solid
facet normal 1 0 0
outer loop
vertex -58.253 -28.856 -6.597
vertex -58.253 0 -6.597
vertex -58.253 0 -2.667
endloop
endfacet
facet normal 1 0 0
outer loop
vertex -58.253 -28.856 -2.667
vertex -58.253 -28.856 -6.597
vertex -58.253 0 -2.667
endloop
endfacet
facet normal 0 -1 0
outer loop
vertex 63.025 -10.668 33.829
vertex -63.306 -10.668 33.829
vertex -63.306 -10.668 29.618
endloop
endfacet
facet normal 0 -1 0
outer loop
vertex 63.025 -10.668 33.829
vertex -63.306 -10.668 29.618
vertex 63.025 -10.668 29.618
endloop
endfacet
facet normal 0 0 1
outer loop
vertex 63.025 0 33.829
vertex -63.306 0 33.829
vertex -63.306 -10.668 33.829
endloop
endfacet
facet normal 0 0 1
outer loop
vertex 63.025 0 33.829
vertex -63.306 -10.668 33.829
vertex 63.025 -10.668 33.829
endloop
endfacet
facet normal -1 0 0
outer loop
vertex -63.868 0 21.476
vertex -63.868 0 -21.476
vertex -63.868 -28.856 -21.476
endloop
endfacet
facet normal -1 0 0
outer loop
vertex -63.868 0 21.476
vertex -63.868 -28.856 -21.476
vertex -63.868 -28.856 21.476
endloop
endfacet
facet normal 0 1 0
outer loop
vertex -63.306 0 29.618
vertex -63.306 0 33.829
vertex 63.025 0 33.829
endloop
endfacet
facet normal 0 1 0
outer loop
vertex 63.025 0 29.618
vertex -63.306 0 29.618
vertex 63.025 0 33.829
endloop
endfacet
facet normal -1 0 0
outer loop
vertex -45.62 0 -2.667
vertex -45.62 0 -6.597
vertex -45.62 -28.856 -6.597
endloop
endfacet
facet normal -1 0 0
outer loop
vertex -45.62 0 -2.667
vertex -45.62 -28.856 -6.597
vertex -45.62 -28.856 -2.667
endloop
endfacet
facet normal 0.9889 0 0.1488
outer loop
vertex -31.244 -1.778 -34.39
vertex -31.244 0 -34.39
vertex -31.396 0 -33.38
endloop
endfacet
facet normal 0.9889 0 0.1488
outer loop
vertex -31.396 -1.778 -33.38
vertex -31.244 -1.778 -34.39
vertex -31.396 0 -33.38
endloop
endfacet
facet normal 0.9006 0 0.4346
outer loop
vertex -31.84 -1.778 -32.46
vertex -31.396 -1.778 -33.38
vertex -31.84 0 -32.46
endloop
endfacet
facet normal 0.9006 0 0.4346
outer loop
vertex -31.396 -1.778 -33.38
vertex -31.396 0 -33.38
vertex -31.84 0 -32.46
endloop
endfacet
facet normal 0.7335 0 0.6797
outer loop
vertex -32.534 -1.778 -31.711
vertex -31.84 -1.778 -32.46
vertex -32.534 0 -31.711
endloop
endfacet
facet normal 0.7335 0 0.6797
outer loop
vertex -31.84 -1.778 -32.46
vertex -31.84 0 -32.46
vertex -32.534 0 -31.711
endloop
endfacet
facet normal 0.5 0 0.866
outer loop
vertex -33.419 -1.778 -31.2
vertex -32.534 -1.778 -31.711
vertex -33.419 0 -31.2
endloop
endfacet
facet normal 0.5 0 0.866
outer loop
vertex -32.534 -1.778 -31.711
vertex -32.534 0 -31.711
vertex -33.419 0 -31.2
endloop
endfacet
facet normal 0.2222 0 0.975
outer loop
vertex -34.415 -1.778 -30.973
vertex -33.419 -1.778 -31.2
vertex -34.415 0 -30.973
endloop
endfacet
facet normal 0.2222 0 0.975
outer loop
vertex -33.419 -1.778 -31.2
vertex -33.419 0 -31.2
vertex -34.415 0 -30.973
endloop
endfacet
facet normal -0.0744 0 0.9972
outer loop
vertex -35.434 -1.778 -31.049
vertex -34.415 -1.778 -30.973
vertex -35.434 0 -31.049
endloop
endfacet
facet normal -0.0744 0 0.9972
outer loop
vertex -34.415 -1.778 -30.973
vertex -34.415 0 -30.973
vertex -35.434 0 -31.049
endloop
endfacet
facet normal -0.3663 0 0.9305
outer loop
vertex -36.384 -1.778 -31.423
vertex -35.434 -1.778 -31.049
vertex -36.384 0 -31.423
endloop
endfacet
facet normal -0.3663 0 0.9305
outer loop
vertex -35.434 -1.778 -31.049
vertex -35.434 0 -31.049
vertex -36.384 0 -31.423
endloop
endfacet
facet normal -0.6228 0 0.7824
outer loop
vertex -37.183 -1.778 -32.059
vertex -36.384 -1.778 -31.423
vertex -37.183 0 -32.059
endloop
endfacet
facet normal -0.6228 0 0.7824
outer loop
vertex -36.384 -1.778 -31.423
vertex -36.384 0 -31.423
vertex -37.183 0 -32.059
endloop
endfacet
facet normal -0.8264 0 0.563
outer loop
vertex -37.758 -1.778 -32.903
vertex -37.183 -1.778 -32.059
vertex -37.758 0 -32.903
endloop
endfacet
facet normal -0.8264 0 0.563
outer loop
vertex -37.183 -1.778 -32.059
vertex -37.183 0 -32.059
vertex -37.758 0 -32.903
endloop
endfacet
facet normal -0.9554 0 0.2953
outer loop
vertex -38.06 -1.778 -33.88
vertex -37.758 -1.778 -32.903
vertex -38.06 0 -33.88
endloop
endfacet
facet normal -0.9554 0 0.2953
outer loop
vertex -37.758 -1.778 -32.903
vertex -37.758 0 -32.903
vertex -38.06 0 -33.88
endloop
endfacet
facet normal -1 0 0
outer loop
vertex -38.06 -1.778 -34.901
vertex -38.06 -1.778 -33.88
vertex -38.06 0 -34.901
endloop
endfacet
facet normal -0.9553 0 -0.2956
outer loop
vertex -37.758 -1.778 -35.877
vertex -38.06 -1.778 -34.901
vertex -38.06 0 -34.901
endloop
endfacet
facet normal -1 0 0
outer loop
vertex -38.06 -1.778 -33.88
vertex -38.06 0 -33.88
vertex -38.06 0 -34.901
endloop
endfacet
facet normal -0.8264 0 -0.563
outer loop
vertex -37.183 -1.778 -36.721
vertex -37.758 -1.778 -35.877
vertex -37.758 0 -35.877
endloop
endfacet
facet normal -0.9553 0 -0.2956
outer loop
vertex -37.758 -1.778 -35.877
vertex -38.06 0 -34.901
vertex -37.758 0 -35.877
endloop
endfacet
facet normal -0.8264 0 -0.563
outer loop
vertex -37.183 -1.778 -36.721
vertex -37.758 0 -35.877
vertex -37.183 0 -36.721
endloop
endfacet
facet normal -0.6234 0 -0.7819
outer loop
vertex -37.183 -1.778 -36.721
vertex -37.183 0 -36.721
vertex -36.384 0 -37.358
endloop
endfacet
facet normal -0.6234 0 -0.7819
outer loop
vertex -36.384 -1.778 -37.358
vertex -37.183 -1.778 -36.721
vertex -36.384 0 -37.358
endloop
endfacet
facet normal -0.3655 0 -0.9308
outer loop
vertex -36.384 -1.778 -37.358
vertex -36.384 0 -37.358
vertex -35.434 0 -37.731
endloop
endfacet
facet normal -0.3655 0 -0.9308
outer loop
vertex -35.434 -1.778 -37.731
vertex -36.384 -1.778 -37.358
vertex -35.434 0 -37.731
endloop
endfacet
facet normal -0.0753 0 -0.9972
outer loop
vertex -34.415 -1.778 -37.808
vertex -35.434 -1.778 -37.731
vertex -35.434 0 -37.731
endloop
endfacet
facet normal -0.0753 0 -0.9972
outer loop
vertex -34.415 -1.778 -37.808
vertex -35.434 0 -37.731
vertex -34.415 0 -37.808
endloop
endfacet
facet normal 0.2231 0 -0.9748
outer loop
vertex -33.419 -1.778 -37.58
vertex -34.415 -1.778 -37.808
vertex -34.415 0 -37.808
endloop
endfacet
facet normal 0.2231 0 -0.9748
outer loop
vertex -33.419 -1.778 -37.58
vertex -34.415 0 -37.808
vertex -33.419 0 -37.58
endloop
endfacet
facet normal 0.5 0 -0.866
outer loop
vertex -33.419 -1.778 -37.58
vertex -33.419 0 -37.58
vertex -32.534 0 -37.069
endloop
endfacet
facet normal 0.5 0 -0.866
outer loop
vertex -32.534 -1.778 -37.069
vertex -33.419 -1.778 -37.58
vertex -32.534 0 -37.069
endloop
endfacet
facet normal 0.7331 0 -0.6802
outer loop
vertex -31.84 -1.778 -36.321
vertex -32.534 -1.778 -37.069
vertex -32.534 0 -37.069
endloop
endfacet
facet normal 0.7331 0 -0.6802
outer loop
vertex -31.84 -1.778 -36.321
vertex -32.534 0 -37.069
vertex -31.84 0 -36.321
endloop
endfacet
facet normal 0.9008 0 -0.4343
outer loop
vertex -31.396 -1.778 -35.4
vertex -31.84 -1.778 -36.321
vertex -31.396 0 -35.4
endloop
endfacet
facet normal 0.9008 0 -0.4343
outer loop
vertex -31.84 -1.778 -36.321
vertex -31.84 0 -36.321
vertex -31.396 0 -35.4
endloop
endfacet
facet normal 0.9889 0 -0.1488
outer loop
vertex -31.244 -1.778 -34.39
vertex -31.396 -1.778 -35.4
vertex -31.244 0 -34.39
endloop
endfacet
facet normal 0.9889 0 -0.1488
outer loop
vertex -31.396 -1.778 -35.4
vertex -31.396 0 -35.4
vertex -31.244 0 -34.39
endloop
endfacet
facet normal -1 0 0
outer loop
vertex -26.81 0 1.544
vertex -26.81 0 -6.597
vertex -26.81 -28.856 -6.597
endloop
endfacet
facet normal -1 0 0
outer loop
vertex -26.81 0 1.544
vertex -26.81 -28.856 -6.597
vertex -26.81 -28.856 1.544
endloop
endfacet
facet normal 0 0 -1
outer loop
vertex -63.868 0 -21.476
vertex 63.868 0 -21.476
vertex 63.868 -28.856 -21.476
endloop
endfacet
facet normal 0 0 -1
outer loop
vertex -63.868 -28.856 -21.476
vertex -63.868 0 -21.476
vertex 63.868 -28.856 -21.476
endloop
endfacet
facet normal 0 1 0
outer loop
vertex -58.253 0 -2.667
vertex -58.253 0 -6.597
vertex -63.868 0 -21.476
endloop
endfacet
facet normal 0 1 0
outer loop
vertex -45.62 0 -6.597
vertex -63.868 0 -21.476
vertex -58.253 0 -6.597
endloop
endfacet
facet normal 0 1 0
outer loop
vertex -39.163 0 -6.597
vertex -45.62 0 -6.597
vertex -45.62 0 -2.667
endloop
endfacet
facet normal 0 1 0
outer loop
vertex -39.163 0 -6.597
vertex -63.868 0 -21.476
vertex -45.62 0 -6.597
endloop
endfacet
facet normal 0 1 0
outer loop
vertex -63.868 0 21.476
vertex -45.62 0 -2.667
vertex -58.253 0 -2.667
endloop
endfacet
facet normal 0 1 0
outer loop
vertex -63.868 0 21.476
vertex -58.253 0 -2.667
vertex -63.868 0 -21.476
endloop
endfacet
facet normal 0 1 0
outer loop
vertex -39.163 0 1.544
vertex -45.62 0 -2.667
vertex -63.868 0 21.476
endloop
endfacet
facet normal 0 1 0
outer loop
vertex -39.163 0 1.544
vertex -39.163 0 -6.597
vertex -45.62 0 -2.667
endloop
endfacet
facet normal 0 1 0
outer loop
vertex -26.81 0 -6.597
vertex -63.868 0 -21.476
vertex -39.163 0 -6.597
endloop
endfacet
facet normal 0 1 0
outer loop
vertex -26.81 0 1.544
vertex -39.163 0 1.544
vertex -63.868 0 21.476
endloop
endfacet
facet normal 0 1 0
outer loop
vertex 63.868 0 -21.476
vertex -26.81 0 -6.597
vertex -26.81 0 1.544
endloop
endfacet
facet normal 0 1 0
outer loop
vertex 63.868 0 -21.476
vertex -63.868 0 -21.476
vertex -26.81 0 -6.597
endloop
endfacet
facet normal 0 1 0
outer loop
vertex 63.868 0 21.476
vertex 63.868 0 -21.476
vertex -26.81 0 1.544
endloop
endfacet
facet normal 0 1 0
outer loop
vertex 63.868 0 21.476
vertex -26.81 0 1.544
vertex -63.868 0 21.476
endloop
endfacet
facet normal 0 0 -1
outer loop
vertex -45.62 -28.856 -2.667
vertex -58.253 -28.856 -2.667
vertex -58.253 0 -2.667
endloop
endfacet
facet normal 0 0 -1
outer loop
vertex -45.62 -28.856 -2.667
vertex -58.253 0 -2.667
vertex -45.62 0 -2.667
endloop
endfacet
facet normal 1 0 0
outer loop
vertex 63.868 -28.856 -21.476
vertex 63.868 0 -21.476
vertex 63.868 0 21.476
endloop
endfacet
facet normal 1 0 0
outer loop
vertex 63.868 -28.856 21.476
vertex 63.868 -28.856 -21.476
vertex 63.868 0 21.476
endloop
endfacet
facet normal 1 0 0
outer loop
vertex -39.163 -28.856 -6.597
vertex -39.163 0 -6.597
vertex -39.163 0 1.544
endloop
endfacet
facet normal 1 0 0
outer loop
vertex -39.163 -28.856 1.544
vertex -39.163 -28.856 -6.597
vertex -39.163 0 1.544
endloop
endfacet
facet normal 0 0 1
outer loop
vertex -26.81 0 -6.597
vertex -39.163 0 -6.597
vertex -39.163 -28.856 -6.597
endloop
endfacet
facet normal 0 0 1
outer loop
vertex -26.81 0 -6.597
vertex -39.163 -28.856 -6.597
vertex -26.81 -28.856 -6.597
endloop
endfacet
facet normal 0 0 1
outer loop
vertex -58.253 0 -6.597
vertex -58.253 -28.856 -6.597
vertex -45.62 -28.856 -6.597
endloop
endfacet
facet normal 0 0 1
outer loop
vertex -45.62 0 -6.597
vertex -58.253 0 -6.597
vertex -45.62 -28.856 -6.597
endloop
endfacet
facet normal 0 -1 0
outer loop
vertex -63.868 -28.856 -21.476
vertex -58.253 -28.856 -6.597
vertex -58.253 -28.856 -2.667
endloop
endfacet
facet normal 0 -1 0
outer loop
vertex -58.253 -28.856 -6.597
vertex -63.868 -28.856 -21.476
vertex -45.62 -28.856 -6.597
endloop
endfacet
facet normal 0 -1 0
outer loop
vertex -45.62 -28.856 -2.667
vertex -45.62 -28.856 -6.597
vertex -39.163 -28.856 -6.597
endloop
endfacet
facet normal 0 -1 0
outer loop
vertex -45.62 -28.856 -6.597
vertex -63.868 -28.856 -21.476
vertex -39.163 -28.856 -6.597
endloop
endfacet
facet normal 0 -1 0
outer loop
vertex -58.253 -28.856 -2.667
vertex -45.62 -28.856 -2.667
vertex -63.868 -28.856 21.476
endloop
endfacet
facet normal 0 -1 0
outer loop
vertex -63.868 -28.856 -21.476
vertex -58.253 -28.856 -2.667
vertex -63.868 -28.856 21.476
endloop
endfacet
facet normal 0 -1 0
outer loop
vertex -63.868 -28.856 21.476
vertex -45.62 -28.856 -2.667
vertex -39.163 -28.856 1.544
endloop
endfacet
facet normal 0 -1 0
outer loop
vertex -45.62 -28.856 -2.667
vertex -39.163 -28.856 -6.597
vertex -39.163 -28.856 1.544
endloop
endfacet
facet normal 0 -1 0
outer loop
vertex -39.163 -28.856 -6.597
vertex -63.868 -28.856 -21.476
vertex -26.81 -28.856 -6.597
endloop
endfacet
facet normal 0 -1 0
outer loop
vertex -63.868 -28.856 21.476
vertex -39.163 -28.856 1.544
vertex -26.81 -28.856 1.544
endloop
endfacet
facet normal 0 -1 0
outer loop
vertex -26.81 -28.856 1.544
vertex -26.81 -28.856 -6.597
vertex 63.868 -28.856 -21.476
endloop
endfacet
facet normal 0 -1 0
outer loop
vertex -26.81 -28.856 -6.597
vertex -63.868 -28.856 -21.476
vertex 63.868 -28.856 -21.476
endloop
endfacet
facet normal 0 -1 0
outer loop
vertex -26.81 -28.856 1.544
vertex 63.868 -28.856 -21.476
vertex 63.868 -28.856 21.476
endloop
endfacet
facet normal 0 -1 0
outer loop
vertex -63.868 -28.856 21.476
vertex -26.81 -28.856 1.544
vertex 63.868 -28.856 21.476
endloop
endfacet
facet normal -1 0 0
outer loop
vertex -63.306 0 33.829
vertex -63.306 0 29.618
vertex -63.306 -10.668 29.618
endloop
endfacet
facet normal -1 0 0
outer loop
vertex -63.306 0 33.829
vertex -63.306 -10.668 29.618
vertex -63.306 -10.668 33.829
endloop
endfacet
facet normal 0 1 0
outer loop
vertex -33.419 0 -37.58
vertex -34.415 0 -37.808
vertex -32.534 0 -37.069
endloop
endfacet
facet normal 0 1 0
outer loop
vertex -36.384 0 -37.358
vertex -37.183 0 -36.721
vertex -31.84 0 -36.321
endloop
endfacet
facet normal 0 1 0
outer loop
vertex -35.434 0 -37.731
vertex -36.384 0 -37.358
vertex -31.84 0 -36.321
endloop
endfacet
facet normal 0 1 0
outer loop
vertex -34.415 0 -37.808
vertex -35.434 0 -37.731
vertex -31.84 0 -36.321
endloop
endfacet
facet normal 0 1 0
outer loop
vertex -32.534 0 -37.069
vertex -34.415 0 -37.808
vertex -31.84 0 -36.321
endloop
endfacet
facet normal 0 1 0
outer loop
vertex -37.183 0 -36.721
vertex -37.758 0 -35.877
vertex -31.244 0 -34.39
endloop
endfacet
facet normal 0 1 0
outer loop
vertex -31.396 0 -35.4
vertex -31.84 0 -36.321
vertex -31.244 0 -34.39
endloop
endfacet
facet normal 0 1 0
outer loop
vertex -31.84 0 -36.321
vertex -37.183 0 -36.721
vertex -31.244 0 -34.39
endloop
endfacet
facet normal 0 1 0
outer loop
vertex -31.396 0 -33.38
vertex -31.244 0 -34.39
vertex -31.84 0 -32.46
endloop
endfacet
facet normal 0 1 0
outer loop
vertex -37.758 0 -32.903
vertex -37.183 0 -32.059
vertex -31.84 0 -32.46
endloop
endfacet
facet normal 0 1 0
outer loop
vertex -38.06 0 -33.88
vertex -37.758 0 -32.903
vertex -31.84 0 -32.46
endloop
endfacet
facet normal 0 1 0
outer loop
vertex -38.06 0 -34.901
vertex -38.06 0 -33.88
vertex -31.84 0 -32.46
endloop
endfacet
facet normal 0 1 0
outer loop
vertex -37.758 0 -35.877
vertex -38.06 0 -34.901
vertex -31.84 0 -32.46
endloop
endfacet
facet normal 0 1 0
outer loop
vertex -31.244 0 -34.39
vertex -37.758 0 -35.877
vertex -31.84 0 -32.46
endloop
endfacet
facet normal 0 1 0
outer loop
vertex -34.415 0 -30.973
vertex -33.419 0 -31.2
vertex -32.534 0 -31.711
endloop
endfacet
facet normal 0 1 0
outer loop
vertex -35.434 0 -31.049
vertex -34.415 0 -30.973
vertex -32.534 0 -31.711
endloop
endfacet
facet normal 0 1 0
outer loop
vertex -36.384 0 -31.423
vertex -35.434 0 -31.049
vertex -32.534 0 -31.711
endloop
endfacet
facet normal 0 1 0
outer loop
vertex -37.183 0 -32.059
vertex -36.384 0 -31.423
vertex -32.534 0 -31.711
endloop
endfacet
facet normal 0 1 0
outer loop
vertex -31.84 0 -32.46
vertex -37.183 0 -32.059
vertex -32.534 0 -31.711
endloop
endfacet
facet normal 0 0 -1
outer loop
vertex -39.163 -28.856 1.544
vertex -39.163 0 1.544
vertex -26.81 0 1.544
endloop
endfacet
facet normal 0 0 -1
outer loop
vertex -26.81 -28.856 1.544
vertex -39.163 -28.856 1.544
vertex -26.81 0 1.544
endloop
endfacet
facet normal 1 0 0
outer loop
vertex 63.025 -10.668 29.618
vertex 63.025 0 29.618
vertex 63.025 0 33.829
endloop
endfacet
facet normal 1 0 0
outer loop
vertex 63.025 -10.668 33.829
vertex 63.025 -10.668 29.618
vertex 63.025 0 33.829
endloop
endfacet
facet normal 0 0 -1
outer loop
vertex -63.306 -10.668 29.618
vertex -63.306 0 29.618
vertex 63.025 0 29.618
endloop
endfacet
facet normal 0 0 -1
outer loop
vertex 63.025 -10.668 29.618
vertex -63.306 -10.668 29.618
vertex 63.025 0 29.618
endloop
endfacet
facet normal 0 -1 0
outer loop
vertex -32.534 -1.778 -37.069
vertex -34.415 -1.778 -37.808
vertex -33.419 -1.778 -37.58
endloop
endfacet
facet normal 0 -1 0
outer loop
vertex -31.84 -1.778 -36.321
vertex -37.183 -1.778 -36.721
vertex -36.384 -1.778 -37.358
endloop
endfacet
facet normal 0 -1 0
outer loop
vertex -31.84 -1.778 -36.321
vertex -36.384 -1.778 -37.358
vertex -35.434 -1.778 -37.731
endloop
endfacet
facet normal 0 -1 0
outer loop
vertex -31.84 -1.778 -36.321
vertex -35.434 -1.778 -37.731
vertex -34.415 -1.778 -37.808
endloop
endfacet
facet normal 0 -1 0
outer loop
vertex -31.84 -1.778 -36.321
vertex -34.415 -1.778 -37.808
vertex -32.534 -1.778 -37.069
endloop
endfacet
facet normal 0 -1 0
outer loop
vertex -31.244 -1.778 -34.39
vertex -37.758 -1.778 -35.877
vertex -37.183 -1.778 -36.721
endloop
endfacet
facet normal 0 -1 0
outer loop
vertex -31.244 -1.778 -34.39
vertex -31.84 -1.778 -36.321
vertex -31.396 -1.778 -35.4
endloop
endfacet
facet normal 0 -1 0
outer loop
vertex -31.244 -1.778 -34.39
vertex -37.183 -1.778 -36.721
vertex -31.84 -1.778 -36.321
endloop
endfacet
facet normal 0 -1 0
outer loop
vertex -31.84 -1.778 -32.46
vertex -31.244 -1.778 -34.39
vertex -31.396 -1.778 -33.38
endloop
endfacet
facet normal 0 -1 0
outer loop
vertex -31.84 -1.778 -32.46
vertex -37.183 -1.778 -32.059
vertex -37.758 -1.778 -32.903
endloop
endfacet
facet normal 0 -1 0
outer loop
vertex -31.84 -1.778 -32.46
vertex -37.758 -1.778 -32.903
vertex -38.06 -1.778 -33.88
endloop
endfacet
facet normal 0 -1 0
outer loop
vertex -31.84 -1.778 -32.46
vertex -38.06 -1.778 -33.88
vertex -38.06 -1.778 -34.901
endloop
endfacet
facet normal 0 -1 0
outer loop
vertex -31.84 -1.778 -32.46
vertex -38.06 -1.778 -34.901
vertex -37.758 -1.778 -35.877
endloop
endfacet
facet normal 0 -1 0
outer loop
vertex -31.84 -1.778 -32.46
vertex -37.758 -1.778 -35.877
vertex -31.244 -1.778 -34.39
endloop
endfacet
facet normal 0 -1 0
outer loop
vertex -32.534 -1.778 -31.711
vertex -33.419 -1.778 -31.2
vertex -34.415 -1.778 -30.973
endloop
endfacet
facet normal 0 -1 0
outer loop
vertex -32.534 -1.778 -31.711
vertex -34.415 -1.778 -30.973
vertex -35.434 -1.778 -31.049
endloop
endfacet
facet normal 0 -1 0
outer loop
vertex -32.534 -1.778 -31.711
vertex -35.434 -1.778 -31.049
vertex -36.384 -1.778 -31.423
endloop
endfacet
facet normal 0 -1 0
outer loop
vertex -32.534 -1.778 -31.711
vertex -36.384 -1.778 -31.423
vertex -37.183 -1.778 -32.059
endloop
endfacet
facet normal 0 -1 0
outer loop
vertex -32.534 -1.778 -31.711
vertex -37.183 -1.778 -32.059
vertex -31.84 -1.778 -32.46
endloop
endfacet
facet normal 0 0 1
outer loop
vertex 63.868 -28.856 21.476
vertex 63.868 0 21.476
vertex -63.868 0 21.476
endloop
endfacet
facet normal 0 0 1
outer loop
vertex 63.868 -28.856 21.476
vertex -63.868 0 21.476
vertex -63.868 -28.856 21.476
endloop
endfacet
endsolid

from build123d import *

# Parameters (mm, degrees)
F0_W     = 127.7352720499
F0_H     = 42.9527387023
F0_W_2   = 12.6331597567
F0_H_2   = 3.9303160738
F0_W_3   = 12.3524200171
F0_H_3   = 8.1413685839
F1_DEPTH = 10.16
F2_W     = 126.3315826654
F2_H     = 4.2110495269
F3_DEPTH = 10.668
F4_R     = 3.4268290795
F5_DEPTH = 1.778
F6_DEPTH = 3.5189203918
F7_DEPTH = 28.8555743173


with BuildPart() as f1:
    # F0 (on Front) → F1 (new body)
    with BuildSketch(Plane.XZ):
        Rectangle(F0_W, F0_H)
        with Locations((-51.9363172352, -4.6321580885)):
            Rectangle(F0_W_2, F0_H_2, mode=Mode.SUBTRACT)
        with Locations((-32.9865785316, -2.5266318335)):
            Rectangle(F0_W_3, F0_H_3, mode=Mode.SUBTRACT)
    extrude(amount=F1_DEPTH)

    # F6 (add): a face of the model
    f6_faces = [f1.faces().sort_by_distance(p)[0] for p in [
        (63.867636025, -5.08, 0),
    ]]
    extrude(f6_faces, amount=-F6_DEPTH)

    # F7 (add): a face of the model
    f7_faces = [f1.faces().sort_by_distance(p)[0] for p in [
        (1.1048863511, 0, 0.0907152896),
    ]]
    extrude(f7_faces, amount=-F7_DEPTH)


with BuildPart() as f3:
    # F2 (on Front) → F3 (new body)
    with BuildSketch(Plane.XZ):
        with Locations((-0.1403689384, 31.7232627422)):
            Rectangle(F2_W, F2_H)
    extrude(amount=F3_DEPTH)


with BuildPart() as f5:
    # F4 (on Front) → F5 (new body)
    with BuildSketch(Plane.XZ):
        with Locations((-34.6710011363, -34.3902632594)):
            Circle(F4_R)
    extrude(amount=F5_DEPTH)


solid = Compound([f1.part, f3.part, f5.part])
